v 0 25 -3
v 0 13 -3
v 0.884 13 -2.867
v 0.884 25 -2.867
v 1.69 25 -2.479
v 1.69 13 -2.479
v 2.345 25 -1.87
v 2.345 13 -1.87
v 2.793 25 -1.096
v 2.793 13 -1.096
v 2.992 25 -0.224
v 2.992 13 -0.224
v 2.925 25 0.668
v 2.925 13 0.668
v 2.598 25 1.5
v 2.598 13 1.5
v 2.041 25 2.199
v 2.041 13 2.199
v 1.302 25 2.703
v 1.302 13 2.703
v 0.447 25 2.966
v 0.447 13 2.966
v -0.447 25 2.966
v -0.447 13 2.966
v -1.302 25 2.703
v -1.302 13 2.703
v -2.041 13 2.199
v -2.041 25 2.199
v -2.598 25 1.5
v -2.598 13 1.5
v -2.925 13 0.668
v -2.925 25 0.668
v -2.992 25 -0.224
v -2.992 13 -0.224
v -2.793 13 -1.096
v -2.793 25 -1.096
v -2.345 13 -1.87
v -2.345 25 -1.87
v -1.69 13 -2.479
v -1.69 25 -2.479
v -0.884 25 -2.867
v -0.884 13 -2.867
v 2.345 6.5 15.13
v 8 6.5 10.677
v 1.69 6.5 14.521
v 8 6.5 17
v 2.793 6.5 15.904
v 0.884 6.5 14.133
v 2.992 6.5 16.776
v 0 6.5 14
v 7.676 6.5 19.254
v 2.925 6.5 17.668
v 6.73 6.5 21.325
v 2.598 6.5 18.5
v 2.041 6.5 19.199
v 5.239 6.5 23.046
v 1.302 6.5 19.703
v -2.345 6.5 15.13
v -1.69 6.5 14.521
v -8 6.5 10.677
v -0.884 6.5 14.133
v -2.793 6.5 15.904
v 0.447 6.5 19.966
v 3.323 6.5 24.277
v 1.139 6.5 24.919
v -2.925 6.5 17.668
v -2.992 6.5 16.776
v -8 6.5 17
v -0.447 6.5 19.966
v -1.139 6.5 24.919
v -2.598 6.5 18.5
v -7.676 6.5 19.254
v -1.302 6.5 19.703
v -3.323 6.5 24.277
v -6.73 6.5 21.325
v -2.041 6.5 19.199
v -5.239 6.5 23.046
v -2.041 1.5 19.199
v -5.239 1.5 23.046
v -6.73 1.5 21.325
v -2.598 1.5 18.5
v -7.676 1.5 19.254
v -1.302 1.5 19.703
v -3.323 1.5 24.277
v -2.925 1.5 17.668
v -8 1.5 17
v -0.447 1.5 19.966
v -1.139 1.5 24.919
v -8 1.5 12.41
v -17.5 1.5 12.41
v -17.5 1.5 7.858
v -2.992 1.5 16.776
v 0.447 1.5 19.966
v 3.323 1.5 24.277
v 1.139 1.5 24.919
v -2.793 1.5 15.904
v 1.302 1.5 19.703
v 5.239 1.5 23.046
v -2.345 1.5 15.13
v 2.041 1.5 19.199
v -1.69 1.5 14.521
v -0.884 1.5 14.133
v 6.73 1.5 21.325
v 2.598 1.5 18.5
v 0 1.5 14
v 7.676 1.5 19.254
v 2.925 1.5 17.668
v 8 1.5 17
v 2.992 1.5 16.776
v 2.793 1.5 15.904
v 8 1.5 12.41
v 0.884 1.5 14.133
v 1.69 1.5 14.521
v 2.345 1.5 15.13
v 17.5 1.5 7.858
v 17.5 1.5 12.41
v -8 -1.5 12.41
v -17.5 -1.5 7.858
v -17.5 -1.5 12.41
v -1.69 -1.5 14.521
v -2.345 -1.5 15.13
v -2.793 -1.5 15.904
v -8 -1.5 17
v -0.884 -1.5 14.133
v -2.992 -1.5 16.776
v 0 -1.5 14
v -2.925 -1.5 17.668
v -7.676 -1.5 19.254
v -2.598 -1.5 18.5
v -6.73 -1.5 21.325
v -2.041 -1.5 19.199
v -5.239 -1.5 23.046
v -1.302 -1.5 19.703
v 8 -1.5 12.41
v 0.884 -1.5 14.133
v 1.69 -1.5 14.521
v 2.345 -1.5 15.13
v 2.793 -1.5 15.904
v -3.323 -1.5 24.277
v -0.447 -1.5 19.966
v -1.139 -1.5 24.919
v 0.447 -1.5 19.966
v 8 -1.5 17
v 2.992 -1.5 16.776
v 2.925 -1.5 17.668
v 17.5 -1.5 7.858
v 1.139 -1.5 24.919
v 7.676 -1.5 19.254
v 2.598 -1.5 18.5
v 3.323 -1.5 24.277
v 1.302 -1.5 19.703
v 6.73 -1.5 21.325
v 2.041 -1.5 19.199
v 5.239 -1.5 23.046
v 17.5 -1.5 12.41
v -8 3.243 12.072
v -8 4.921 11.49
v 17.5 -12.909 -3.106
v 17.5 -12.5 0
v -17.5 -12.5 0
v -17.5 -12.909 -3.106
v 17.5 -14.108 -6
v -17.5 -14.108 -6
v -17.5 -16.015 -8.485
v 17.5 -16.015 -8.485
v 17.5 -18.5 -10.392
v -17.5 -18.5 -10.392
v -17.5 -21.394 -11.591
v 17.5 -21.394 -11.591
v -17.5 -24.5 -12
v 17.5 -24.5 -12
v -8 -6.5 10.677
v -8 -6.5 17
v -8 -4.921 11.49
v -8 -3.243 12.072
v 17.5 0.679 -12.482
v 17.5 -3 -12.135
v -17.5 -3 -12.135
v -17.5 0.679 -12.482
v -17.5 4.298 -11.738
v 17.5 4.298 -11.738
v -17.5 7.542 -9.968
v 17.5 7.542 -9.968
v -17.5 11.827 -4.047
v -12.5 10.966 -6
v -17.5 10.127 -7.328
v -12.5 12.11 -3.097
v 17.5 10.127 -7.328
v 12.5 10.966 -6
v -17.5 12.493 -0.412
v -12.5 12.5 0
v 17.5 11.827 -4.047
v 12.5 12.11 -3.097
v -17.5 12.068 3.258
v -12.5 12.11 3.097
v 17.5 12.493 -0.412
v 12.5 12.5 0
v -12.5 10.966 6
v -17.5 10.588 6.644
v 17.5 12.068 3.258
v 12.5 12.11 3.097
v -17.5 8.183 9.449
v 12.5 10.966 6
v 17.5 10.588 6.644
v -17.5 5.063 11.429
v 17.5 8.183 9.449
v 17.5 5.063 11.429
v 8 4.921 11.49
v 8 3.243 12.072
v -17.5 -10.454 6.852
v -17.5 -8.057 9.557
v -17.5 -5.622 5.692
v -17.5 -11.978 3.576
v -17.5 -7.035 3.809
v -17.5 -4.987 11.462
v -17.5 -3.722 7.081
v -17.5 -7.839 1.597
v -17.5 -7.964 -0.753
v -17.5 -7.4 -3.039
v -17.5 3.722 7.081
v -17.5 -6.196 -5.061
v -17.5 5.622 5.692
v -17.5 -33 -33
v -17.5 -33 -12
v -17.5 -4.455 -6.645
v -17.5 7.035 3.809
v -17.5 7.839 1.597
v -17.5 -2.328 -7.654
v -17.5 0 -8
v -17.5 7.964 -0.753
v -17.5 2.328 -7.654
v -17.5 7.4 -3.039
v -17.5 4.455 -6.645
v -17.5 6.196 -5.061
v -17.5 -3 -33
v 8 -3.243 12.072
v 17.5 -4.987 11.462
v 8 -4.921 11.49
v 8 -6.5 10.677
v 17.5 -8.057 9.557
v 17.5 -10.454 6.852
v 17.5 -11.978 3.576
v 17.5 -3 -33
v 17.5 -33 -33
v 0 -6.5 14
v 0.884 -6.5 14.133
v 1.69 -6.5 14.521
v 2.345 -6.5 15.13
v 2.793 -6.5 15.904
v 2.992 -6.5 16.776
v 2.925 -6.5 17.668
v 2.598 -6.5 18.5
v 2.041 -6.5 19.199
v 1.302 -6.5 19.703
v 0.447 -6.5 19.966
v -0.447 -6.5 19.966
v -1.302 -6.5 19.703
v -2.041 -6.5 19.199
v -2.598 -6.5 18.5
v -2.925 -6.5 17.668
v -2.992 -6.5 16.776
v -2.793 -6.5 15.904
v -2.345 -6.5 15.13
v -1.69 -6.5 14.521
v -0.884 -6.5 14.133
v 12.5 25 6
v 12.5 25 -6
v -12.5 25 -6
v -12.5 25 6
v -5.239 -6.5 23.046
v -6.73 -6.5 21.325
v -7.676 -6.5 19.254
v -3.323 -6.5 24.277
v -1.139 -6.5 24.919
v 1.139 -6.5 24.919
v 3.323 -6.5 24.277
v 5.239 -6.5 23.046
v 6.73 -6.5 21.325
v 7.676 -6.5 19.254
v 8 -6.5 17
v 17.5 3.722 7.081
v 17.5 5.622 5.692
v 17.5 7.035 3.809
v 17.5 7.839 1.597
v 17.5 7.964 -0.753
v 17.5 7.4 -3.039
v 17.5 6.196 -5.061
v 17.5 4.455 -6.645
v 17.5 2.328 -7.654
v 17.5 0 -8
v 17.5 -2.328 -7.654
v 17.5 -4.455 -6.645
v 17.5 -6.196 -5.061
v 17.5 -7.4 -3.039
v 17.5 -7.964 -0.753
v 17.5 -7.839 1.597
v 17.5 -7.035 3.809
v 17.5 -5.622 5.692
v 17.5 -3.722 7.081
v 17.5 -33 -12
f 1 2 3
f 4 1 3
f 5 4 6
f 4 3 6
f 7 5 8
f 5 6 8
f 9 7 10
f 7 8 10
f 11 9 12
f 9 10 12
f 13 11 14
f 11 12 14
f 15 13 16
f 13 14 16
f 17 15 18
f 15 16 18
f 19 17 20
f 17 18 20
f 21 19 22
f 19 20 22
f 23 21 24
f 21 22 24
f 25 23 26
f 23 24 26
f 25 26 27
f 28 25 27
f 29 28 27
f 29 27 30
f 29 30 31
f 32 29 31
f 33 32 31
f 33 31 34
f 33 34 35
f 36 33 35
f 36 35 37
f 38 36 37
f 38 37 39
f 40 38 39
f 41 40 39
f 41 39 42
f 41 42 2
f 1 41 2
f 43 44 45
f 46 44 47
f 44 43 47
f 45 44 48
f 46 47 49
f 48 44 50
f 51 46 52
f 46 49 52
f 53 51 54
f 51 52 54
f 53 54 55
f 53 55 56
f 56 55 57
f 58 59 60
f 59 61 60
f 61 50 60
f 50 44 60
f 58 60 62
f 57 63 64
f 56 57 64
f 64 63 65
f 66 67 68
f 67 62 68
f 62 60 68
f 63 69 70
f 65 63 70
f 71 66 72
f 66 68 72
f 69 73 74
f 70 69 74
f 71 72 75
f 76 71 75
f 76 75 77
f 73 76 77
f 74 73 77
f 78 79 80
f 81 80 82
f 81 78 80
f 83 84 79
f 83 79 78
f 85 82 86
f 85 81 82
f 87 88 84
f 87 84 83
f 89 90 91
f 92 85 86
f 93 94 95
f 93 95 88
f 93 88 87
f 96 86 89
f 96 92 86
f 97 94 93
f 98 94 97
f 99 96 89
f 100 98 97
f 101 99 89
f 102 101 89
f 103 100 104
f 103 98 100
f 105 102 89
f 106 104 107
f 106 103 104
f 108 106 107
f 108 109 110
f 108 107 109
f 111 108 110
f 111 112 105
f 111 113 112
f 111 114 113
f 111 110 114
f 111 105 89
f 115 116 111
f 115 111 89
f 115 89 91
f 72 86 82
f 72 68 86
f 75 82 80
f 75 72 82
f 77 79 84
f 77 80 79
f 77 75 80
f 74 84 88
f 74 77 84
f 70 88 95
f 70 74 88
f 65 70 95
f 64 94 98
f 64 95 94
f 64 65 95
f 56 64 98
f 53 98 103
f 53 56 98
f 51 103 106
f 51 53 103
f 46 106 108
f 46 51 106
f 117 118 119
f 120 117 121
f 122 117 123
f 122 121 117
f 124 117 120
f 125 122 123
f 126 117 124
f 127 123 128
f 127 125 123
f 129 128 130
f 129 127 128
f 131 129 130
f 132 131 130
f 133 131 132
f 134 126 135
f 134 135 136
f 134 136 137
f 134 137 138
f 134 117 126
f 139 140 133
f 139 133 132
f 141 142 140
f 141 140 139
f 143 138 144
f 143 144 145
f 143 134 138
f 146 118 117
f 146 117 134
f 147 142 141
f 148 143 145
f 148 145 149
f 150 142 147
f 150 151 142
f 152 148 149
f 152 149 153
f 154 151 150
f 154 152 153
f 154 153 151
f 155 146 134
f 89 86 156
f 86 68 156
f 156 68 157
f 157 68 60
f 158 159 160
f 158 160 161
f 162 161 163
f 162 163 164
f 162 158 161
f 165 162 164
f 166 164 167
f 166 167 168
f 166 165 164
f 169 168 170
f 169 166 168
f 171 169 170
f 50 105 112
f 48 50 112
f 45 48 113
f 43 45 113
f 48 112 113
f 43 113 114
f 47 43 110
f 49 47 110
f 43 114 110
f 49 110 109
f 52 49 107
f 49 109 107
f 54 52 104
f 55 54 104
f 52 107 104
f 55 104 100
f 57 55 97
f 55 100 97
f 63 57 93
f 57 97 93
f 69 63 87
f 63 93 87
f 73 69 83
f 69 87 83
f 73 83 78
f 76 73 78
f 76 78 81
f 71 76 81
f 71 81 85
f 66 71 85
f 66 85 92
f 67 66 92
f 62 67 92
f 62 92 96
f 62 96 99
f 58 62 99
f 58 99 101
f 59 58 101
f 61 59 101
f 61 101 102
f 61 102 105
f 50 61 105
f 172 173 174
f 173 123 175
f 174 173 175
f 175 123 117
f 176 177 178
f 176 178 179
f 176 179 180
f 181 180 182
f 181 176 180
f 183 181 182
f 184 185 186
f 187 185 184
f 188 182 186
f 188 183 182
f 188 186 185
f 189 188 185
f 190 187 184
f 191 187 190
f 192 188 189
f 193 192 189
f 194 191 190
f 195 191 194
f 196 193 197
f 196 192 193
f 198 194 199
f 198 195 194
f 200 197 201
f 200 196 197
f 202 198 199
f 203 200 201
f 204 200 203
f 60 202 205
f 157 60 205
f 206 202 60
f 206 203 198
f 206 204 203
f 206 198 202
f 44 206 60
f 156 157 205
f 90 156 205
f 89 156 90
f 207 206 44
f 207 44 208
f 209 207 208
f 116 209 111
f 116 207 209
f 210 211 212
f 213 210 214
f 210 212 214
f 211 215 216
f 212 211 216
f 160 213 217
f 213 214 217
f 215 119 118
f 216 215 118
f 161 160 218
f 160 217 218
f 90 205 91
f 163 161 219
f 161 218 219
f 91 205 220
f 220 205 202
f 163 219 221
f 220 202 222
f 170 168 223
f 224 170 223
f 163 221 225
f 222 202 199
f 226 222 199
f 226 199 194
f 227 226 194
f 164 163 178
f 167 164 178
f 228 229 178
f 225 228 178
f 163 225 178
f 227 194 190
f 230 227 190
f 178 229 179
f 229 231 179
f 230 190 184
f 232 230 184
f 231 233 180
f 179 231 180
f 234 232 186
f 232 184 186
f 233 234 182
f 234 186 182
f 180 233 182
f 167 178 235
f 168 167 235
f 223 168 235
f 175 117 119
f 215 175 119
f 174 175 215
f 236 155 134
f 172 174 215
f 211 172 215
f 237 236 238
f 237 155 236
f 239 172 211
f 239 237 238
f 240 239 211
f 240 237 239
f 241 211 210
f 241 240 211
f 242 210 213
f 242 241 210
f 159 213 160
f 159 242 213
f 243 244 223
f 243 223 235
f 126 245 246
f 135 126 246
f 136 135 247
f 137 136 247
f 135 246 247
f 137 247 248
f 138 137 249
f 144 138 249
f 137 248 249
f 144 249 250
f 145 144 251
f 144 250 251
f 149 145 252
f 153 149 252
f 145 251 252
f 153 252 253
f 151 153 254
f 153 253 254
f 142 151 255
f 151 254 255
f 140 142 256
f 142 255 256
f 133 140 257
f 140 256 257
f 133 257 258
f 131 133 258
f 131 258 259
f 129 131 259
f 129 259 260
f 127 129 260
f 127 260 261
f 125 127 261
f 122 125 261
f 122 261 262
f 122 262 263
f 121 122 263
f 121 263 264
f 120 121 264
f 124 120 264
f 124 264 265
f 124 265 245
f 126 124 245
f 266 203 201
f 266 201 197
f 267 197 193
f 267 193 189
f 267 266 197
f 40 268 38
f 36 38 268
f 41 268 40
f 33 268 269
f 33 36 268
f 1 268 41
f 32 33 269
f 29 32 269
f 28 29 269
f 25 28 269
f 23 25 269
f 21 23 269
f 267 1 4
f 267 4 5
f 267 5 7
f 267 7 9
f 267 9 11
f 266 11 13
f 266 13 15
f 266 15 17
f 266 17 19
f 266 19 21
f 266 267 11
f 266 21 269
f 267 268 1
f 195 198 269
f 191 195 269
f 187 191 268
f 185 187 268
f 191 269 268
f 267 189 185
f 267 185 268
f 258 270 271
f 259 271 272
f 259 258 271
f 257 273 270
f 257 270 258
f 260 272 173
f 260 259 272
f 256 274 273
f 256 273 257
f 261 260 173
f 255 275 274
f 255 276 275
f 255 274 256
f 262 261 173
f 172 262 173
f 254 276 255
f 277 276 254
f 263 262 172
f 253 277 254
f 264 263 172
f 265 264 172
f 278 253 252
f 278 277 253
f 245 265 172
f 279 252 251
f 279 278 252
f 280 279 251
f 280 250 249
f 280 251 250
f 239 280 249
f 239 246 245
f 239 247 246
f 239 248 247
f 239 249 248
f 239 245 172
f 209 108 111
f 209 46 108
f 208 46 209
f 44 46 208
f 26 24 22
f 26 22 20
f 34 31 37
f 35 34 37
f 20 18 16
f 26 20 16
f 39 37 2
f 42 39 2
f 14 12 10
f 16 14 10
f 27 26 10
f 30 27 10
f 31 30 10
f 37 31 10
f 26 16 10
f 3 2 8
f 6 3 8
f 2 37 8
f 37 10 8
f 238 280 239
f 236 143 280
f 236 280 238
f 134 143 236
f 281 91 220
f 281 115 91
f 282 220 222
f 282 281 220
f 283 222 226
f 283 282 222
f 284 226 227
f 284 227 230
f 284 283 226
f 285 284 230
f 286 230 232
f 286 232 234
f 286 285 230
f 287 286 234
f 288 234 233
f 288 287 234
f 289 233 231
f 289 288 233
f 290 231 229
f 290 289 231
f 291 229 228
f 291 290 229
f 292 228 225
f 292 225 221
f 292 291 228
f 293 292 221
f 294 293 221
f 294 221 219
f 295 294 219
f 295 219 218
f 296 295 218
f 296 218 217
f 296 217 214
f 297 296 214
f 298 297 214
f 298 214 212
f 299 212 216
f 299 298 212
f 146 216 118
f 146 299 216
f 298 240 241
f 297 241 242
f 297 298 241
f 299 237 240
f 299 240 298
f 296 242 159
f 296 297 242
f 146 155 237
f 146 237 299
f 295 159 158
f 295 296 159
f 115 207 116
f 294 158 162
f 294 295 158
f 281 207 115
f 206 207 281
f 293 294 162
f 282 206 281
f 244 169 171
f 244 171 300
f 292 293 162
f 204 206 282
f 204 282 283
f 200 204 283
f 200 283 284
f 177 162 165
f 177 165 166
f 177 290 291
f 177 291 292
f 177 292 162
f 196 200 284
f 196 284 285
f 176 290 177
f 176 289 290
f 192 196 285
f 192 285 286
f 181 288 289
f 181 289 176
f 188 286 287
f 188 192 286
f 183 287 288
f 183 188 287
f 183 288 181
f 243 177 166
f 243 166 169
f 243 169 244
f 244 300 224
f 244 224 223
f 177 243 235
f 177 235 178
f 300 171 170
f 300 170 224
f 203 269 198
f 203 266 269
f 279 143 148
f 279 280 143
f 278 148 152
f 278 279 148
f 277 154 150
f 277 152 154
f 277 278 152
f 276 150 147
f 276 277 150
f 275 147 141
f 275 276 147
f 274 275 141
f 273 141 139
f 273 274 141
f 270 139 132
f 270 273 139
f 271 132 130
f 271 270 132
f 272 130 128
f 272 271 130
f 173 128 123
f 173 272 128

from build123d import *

# Parameters (mm, degrees)
BOSS_EXTRUDE1_DEPTH       = 17.5
BOSS_EXTRUDE2_DEPTH       = 12.5
BOSS_EXTRUDE3_DEPTH       = 8
FILLET1_RADIUS            = 8
FILLET1_LENGTH            = 5
FILLET2_RADIUS            = 8
FILLET2_LENGTH            = 5
F_6_0MM_DOWEL_HOLE1_D     = 6
F_6_0MM_DOWEL_HOLE1_DEPTH = 21.06015
F_6_0MM_DOWEL_HOLE2_D     = 6
F_6_0MM_DOWEL_HOLE2_DEPTH = 12


with BuildPart() as part:
    # Sketch1 → Boss-Extrude1 (new, symmetric)
    with BuildSketch(Plane(origin=(0, 0, 0), x_dir=(0, 0, -1), z_dir=(1, 0, 0))):
        with BuildLine():
            Line((-7.858116823, -1.5), (-12.409673646, -1.5))
            ThreePointArc((-12.409673646, -1.5), (-8.291561976, -9.354143467), (0, -12.5))
            ThreePointArc((0, -12.5), (8.485281374, -16.014718626), (12, -24.5))
            Line((12, -24.5), (12, -33))
            Line((12, -33), (33, -33))
            Line((33, -33), (33, -3))
            Line((33, -3), (12.1346611, -3))
            ThreePointArc((12.1346611, -3), (2.254197856, 12.295063726), (-12.409673646, 1.5))
            Line((-12.409673646, 1.5), (-7.858116823, 1.5))
            ThreePointArc((-7.858116823, 1.5), (8, 0), (-7.858116823, -1.5))
        make_face()
    extrude(amount=BOSS_EXTRUDE1_DEPTH, both=True)

    # Sketch1<3> → Boss-Extrude2 (add, symmetric)
    with BuildSketch(Plane(origin=(0, 0, 0), x_dir=(0, 0, -1), z_dir=(1, 0, 0))):
        with BuildLine():
            ThreePointArc((-6, 10.9658561), (0, 12.5), (6, 10.9658561))
            Line((6, 10.9658561), (6, 25))
            Line((6, 25), (-6, 25))
            Line((-6, 25), (-6, 10.9658561))
        make_face()
    extrude(amount=BOSS_EXTRUDE2_DEPTH, both=True)

    # Sketch1<4> → Boss-Extrude3 (add, symmetric)
    with BuildSketch(Plane(origin=(0, 0, 0), x_dir=(0, 0, -1), z_dir=(1, 0, 0))):
        with BuildLine():
            ThreePointArc((-12.409673646, 1.5), (-11.810991842, 4.092734013), (-10.677078252, 6.5))
            Line((-10.677078252, 6.5), (-25, 6.5))
            Line((-25, 6.5), (-25, 1.5))
            Line((-25, 1.5), (-12.409673646, 1.5))
        make_face()
        with BuildLine():
            Line((-25, -6.5), (-10.677078252, -6.5))
            ThreePointArc((-10.677078252, -6.5), (-11.810991842, -4.092734013), (-12.409673646, -1.5))
            Line((-12.409673646, -1.5), (-25, -1.5))
            Line((-25, -1.5), (-25, -6.5))
        make_face()
    extrude(amount=BOSS_EXTRUDE3_DEPTH, both=True)

    # Fillet1: full round fillet: the end face becomes a half cylinder, R = half its width
    fillet1_face = Plane((0, 4, 25), x_dir=(0, 1, 0), z_dir=(0, 0, 1))  # on the end face: x along it, z out of the body
    fillet1_slab = fillet1_face.offset(-FILLET1_RADIUS / 2) * Box(FILLET1_LENGTH, 2 * FILLET1_RADIUS, FILLET1_RADIUS, mode=Mode.PRIVATE)  # the body's end, R deep
    fillet1_round = Plane((0, 4, 17), x_dir=(0, 0, 1), z_dir=(0, 1, 0)) * Cylinder(FILLET1_RADIUS, FILLET1_LENGTH, mode=Mode.PRIVATE)  # its axis R under the face
    add(fillet1_slab - fillet1_round, mode=Mode.SUBTRACT)

    # Fillet2: full round fillet: the end face becomes a half cylinder, R = half its width
    fillet2_face = Plane((0, -4, 25), x_dir=(0, -1, 0), z_dir=(0, 0, 1))  # on the end face: x along it, z out of the body
    fillet2_slab = fillet2_face.offset(-FILLET2_RADIUS / 2) * Box(FILLET2_LENGTH, 2 * FILLET2_RADIUS, FILLET2_RADIUS, mode=Mode.PRIVATE)  # the body's end, R deep
    fillet2_round = Plane((0, -4, 17), x_dir=(0, 0, 1), z_dir=(0, -1, 0)) * Cylinder(FILLET2_RADIUS, FILLET2_LENGTH, mode=Mode.PRIVATE)  # its axis R under the face
    add(fillet2_slab - fillet2_round, mode=Mode.SUBTRACT)

    # Ø6.0mm Dowel Hole1
    with Locations(Plane(origin=(0, 6.5, 17), x_dir=(0, 0, 1), z_dir=(0, 1, 0))):
        with Locations((0, 0)):
            Hole(F_6_0MM_DOWEL_HOLE1_D / 2, depth=F_6_0MM_DOWEL_HOLE1_DEPTH)

    # Ø6.0mm Dowel Hole2
    with Locations(Plane.ZX.offset(25)):
        with Locations((0, 0)):
            Hole(F_6_0MM_DOWEL_HOLE2_D / 2, depth=F_6_0MM_DOWEL_HOLE2_DEPTH)


solid = part.part
